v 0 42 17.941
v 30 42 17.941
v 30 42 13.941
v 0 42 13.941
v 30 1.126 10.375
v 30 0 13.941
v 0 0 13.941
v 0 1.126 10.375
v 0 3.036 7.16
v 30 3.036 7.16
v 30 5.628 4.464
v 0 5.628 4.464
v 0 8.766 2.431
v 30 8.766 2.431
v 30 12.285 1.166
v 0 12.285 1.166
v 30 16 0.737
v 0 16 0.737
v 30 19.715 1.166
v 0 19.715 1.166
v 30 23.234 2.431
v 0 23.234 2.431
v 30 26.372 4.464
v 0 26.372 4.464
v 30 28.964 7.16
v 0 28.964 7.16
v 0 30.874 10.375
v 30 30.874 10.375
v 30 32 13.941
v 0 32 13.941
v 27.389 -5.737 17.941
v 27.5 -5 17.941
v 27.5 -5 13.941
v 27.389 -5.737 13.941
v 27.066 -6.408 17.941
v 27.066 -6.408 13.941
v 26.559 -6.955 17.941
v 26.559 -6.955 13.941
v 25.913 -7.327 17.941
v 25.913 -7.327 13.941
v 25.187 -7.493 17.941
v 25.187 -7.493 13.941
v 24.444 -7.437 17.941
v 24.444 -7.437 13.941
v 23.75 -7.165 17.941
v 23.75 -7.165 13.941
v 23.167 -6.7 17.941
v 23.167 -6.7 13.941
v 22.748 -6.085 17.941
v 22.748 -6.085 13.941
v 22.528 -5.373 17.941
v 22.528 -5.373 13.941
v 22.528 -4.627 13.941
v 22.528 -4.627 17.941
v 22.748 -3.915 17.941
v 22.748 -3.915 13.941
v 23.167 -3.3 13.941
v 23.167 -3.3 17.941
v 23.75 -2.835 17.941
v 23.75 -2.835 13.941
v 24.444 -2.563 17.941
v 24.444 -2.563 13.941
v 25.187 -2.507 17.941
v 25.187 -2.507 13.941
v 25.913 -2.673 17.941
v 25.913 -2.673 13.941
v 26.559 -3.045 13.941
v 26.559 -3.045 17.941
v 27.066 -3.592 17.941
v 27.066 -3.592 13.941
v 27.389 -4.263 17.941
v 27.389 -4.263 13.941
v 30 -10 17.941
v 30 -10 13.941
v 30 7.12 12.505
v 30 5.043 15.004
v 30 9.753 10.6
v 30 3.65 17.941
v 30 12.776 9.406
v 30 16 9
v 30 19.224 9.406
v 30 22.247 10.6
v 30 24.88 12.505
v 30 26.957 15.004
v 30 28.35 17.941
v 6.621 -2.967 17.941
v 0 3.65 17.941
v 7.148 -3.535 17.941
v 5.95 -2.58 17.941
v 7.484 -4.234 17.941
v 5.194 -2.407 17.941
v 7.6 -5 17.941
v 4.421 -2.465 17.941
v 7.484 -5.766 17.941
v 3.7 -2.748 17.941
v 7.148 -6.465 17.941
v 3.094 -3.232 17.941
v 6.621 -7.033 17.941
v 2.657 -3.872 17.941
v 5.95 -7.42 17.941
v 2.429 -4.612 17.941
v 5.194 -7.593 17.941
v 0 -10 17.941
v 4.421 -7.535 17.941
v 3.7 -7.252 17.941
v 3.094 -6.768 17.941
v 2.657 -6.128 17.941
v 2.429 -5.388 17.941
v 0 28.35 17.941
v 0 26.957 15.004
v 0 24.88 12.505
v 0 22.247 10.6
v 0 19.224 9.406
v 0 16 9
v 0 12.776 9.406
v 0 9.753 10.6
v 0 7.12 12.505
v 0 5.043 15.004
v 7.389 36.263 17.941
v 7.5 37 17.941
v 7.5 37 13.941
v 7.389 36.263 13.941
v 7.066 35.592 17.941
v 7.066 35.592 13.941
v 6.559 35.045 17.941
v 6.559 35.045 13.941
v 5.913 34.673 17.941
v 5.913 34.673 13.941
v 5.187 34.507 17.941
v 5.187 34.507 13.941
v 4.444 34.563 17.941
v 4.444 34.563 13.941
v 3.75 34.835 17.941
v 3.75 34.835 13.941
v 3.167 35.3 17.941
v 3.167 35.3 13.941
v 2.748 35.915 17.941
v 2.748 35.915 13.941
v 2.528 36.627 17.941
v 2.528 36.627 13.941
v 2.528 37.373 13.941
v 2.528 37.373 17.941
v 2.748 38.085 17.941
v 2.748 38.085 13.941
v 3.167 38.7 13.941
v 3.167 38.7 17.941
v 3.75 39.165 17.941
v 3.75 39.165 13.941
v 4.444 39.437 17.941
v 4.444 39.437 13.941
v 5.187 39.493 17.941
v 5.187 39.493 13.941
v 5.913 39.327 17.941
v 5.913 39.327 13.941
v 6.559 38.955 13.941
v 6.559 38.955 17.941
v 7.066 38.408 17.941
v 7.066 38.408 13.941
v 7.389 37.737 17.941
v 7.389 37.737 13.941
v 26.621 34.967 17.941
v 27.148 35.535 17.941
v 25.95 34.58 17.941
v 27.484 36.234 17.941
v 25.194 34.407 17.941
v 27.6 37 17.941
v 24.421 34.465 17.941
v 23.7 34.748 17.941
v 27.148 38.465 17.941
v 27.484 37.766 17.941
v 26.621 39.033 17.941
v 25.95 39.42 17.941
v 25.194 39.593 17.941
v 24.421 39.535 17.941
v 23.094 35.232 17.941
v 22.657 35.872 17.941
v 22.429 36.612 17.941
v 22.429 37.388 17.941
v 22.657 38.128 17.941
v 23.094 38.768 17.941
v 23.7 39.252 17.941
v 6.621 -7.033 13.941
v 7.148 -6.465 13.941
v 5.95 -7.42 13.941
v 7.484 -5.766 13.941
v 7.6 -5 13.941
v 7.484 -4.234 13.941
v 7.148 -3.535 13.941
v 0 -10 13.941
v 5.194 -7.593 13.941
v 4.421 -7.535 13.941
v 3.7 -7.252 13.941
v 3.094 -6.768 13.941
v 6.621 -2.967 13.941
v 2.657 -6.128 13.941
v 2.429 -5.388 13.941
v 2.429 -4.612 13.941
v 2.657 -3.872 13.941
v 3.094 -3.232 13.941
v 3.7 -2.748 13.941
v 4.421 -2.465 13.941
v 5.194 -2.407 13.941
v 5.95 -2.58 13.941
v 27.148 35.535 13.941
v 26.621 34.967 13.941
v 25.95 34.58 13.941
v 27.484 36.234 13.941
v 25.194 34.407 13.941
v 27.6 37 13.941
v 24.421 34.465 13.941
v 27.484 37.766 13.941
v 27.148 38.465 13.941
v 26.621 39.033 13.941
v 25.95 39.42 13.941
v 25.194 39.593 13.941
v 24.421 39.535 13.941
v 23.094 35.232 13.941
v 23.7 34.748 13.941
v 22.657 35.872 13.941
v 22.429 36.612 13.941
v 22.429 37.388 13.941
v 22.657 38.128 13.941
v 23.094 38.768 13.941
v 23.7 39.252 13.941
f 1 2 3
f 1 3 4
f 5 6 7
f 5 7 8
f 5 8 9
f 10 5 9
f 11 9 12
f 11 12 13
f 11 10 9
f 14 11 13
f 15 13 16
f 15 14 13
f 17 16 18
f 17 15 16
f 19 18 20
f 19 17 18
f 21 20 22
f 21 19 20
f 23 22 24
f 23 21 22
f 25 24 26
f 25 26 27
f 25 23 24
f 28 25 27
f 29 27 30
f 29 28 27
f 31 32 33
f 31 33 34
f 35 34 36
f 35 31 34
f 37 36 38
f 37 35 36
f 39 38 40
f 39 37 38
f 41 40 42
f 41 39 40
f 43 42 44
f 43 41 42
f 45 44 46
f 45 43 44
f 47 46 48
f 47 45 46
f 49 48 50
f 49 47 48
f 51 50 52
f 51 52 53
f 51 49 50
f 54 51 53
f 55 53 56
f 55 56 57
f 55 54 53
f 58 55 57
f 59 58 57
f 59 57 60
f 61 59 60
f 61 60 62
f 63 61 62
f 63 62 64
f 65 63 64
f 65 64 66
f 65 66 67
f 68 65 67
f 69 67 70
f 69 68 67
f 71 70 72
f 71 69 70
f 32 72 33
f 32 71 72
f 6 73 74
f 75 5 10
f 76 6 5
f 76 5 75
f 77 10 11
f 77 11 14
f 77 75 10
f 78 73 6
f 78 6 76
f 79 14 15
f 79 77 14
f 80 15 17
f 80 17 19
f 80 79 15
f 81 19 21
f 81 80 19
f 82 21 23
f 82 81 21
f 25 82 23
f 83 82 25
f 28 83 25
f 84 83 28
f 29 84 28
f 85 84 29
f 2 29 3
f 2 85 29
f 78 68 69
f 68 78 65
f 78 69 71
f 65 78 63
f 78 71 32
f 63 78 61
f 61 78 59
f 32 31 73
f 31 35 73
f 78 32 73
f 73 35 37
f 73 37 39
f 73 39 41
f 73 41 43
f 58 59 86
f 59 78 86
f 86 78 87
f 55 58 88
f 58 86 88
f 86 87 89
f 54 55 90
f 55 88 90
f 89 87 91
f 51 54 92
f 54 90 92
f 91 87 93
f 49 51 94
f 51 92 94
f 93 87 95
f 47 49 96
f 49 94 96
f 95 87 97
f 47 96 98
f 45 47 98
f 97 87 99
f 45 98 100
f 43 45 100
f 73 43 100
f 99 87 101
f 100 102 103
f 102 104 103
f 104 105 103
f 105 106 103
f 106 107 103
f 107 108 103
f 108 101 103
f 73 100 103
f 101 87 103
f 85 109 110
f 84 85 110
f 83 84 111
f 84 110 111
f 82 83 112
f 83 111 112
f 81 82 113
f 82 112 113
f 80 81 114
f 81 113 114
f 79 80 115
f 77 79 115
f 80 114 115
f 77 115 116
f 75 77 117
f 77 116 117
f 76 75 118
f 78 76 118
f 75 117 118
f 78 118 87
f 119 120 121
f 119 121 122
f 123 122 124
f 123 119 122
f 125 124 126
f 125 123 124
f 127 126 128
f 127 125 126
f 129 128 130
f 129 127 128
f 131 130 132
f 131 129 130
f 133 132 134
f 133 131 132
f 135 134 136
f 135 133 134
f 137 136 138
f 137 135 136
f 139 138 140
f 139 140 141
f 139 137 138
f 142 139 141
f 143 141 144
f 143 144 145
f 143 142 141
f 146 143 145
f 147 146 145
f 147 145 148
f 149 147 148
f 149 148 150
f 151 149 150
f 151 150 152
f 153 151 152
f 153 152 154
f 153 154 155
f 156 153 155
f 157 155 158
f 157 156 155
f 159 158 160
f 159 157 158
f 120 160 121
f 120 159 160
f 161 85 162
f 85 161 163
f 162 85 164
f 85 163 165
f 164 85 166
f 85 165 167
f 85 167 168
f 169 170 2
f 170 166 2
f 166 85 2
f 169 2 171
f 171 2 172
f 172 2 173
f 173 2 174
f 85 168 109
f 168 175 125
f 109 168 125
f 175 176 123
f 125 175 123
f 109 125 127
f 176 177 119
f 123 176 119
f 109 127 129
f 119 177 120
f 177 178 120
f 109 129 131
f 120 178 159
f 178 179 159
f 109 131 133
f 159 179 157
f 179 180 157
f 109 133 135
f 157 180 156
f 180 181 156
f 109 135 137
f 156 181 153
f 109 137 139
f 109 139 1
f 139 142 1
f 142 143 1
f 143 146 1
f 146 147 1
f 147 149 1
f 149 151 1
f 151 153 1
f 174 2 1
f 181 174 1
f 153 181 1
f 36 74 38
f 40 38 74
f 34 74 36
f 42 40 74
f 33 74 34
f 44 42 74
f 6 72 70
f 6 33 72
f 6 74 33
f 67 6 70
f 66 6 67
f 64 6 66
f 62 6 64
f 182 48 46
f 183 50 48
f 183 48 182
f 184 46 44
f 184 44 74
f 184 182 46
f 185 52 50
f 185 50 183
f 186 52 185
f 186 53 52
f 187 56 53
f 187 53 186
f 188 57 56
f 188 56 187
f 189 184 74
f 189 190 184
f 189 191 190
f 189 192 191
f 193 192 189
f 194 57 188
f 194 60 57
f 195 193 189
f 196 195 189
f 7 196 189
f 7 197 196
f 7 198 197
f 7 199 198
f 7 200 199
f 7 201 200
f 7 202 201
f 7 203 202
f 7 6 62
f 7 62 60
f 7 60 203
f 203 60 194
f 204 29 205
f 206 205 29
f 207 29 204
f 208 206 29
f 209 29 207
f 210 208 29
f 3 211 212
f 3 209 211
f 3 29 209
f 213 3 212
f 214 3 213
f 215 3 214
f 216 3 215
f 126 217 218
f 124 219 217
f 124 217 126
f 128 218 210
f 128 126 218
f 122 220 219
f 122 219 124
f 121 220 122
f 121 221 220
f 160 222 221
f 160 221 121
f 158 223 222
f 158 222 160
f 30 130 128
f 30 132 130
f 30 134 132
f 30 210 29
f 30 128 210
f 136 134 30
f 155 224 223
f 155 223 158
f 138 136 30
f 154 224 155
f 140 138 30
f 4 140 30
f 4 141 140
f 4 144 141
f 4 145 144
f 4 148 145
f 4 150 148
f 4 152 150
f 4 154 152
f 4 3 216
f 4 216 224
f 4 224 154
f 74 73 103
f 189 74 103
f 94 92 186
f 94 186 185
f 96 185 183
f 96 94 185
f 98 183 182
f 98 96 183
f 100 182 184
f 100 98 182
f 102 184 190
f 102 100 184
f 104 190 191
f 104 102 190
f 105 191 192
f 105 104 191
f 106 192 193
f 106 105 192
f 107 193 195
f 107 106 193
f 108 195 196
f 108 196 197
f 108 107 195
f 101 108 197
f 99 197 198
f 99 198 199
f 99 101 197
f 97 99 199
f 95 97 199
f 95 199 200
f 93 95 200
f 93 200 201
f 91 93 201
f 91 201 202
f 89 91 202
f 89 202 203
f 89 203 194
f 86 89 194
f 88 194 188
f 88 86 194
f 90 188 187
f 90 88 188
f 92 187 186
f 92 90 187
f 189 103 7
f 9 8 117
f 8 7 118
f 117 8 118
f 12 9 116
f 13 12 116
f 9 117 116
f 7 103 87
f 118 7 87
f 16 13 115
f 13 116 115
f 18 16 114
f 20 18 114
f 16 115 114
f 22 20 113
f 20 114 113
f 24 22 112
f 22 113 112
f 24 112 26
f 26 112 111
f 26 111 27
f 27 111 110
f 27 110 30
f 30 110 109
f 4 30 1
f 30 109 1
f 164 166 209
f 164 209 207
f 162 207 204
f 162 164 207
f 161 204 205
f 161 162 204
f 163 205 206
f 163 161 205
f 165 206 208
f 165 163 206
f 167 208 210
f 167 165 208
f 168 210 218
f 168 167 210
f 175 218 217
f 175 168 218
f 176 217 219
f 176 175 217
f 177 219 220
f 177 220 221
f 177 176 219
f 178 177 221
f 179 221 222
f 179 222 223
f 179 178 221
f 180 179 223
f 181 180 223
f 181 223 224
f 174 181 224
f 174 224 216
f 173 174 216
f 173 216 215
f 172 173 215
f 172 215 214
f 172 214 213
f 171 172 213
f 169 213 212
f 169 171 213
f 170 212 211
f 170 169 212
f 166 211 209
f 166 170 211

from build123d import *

# Parameters (mm, degrees)
SKETCH_1_W          = 30
SKETCH_1_H          = 32
EXTRUDE_1_DEPTH     = 7
EXTRUDE_2_DEPTH     = 30
SKETCH_3_W          = 30
SKETCH_3_H          = 10
SKETCH_3_R          = 2.6
SKETCH_3_R_2        = 2.5
EXTRUDE_3_DEPTH     = 4
CUT_EXTRUDE_1_DEPTH = 60


with BuildPart() as part:
    # Эскиз1 → Бобышка-Вытянуть1 (new body)
    with BuildSketch(Plane.XY):
        with Locations((15, 16)):
            Rectangle(SKETCH_1_W, SKETCH_1_H)
    extrude(amount=EXTRUDE_1_DEPTH)

    # Эскиз2 → Бобышка-Вытянуть2 (add)
    with BuildSketch(Plane.ZY):
        with BuildLine():
            Line((7, 32), (17.940751301, 32))
            Line((17.940751301, 32), (17.940751301, 28.35))
            ThreePointArc((17.940751301, 28.35), (9, 16), (17.940751301, 3.65))
            Line((17.940751301, 3.65), (17.940751301, 0))
            Line((17.940751301, 0), (7, 0))
            Line((7, 0), (7, 32))
        make_face()
    extrude(amount=-EXTRUDE_2_DEPTH)

    # Эскиз3 → Бобышка-Вытянуть3 (add)
    # profile 1 of 2: a face of its own
    with BuildSketch(Plane(origin=(0, 0, 17.940751301), x_dir=(-1, 0, 0), z_dir=(0, 0, -1))):
        with Locations((-15, 37)):
            Rectangle(SKETCH_3_W, SKETCH_3_H)
        with Locations(Location((-25, 37, 0), (0, 0, 180))):
            Circle(SKETCH_3_R, mode=Mode.SUBTRACT)
        with Locations(Location((-5, 37, 0), (0, 0, 180))):
            Circle(SKETCH_3_R_2, mode=Mode.SUBTRACT)
    # profile 2 of 2: a face of its own
    with BuildSketch(Plane(origin=(0, 0, 17.940751301), x_dir=(-1, 0, 0), z_dir=(0, 0, -1))):
        with Locations((-15, -5)):
            Rectangle(SKETCH_3_W, SKETCH_3_H)
        with Locations(Location((-25, -5, 0), (0, 0, 180))):
            Circle(SKETCH_3_R_2, mode=Mode.SUBTRACT)
        with Locations(Location((-5, -5, 0), (0, 0, 180))):
            Circle(SKETCH_3_R, mode=Mode.SUBTRACT)
    extrude(amount=EXTRUDE_3_DEPTH)

    # Эскиз4 → Вырез-Вытянуть1 (cut)
    with BuildSketch(Plane(origin=(30, 0, 0), x_dir=(0, 0, -1), z_dir=(1, 0, 0))):
        with BuildLine():
            Line((-13.940751301, 32), (0, 32))
            Line((0, 32), (0, 0))
            Line((0, 0), (-13.940751301, 0))
            ThreePointArc((-13.940751301, 0), (-0.73723231, 16), (-13.940751301, 32))
        make_face()
    extrude(amount=-CUT_EXTRUDE_1_DEPTH, mode=Mode.SUBTRACT)


solid = part.part
